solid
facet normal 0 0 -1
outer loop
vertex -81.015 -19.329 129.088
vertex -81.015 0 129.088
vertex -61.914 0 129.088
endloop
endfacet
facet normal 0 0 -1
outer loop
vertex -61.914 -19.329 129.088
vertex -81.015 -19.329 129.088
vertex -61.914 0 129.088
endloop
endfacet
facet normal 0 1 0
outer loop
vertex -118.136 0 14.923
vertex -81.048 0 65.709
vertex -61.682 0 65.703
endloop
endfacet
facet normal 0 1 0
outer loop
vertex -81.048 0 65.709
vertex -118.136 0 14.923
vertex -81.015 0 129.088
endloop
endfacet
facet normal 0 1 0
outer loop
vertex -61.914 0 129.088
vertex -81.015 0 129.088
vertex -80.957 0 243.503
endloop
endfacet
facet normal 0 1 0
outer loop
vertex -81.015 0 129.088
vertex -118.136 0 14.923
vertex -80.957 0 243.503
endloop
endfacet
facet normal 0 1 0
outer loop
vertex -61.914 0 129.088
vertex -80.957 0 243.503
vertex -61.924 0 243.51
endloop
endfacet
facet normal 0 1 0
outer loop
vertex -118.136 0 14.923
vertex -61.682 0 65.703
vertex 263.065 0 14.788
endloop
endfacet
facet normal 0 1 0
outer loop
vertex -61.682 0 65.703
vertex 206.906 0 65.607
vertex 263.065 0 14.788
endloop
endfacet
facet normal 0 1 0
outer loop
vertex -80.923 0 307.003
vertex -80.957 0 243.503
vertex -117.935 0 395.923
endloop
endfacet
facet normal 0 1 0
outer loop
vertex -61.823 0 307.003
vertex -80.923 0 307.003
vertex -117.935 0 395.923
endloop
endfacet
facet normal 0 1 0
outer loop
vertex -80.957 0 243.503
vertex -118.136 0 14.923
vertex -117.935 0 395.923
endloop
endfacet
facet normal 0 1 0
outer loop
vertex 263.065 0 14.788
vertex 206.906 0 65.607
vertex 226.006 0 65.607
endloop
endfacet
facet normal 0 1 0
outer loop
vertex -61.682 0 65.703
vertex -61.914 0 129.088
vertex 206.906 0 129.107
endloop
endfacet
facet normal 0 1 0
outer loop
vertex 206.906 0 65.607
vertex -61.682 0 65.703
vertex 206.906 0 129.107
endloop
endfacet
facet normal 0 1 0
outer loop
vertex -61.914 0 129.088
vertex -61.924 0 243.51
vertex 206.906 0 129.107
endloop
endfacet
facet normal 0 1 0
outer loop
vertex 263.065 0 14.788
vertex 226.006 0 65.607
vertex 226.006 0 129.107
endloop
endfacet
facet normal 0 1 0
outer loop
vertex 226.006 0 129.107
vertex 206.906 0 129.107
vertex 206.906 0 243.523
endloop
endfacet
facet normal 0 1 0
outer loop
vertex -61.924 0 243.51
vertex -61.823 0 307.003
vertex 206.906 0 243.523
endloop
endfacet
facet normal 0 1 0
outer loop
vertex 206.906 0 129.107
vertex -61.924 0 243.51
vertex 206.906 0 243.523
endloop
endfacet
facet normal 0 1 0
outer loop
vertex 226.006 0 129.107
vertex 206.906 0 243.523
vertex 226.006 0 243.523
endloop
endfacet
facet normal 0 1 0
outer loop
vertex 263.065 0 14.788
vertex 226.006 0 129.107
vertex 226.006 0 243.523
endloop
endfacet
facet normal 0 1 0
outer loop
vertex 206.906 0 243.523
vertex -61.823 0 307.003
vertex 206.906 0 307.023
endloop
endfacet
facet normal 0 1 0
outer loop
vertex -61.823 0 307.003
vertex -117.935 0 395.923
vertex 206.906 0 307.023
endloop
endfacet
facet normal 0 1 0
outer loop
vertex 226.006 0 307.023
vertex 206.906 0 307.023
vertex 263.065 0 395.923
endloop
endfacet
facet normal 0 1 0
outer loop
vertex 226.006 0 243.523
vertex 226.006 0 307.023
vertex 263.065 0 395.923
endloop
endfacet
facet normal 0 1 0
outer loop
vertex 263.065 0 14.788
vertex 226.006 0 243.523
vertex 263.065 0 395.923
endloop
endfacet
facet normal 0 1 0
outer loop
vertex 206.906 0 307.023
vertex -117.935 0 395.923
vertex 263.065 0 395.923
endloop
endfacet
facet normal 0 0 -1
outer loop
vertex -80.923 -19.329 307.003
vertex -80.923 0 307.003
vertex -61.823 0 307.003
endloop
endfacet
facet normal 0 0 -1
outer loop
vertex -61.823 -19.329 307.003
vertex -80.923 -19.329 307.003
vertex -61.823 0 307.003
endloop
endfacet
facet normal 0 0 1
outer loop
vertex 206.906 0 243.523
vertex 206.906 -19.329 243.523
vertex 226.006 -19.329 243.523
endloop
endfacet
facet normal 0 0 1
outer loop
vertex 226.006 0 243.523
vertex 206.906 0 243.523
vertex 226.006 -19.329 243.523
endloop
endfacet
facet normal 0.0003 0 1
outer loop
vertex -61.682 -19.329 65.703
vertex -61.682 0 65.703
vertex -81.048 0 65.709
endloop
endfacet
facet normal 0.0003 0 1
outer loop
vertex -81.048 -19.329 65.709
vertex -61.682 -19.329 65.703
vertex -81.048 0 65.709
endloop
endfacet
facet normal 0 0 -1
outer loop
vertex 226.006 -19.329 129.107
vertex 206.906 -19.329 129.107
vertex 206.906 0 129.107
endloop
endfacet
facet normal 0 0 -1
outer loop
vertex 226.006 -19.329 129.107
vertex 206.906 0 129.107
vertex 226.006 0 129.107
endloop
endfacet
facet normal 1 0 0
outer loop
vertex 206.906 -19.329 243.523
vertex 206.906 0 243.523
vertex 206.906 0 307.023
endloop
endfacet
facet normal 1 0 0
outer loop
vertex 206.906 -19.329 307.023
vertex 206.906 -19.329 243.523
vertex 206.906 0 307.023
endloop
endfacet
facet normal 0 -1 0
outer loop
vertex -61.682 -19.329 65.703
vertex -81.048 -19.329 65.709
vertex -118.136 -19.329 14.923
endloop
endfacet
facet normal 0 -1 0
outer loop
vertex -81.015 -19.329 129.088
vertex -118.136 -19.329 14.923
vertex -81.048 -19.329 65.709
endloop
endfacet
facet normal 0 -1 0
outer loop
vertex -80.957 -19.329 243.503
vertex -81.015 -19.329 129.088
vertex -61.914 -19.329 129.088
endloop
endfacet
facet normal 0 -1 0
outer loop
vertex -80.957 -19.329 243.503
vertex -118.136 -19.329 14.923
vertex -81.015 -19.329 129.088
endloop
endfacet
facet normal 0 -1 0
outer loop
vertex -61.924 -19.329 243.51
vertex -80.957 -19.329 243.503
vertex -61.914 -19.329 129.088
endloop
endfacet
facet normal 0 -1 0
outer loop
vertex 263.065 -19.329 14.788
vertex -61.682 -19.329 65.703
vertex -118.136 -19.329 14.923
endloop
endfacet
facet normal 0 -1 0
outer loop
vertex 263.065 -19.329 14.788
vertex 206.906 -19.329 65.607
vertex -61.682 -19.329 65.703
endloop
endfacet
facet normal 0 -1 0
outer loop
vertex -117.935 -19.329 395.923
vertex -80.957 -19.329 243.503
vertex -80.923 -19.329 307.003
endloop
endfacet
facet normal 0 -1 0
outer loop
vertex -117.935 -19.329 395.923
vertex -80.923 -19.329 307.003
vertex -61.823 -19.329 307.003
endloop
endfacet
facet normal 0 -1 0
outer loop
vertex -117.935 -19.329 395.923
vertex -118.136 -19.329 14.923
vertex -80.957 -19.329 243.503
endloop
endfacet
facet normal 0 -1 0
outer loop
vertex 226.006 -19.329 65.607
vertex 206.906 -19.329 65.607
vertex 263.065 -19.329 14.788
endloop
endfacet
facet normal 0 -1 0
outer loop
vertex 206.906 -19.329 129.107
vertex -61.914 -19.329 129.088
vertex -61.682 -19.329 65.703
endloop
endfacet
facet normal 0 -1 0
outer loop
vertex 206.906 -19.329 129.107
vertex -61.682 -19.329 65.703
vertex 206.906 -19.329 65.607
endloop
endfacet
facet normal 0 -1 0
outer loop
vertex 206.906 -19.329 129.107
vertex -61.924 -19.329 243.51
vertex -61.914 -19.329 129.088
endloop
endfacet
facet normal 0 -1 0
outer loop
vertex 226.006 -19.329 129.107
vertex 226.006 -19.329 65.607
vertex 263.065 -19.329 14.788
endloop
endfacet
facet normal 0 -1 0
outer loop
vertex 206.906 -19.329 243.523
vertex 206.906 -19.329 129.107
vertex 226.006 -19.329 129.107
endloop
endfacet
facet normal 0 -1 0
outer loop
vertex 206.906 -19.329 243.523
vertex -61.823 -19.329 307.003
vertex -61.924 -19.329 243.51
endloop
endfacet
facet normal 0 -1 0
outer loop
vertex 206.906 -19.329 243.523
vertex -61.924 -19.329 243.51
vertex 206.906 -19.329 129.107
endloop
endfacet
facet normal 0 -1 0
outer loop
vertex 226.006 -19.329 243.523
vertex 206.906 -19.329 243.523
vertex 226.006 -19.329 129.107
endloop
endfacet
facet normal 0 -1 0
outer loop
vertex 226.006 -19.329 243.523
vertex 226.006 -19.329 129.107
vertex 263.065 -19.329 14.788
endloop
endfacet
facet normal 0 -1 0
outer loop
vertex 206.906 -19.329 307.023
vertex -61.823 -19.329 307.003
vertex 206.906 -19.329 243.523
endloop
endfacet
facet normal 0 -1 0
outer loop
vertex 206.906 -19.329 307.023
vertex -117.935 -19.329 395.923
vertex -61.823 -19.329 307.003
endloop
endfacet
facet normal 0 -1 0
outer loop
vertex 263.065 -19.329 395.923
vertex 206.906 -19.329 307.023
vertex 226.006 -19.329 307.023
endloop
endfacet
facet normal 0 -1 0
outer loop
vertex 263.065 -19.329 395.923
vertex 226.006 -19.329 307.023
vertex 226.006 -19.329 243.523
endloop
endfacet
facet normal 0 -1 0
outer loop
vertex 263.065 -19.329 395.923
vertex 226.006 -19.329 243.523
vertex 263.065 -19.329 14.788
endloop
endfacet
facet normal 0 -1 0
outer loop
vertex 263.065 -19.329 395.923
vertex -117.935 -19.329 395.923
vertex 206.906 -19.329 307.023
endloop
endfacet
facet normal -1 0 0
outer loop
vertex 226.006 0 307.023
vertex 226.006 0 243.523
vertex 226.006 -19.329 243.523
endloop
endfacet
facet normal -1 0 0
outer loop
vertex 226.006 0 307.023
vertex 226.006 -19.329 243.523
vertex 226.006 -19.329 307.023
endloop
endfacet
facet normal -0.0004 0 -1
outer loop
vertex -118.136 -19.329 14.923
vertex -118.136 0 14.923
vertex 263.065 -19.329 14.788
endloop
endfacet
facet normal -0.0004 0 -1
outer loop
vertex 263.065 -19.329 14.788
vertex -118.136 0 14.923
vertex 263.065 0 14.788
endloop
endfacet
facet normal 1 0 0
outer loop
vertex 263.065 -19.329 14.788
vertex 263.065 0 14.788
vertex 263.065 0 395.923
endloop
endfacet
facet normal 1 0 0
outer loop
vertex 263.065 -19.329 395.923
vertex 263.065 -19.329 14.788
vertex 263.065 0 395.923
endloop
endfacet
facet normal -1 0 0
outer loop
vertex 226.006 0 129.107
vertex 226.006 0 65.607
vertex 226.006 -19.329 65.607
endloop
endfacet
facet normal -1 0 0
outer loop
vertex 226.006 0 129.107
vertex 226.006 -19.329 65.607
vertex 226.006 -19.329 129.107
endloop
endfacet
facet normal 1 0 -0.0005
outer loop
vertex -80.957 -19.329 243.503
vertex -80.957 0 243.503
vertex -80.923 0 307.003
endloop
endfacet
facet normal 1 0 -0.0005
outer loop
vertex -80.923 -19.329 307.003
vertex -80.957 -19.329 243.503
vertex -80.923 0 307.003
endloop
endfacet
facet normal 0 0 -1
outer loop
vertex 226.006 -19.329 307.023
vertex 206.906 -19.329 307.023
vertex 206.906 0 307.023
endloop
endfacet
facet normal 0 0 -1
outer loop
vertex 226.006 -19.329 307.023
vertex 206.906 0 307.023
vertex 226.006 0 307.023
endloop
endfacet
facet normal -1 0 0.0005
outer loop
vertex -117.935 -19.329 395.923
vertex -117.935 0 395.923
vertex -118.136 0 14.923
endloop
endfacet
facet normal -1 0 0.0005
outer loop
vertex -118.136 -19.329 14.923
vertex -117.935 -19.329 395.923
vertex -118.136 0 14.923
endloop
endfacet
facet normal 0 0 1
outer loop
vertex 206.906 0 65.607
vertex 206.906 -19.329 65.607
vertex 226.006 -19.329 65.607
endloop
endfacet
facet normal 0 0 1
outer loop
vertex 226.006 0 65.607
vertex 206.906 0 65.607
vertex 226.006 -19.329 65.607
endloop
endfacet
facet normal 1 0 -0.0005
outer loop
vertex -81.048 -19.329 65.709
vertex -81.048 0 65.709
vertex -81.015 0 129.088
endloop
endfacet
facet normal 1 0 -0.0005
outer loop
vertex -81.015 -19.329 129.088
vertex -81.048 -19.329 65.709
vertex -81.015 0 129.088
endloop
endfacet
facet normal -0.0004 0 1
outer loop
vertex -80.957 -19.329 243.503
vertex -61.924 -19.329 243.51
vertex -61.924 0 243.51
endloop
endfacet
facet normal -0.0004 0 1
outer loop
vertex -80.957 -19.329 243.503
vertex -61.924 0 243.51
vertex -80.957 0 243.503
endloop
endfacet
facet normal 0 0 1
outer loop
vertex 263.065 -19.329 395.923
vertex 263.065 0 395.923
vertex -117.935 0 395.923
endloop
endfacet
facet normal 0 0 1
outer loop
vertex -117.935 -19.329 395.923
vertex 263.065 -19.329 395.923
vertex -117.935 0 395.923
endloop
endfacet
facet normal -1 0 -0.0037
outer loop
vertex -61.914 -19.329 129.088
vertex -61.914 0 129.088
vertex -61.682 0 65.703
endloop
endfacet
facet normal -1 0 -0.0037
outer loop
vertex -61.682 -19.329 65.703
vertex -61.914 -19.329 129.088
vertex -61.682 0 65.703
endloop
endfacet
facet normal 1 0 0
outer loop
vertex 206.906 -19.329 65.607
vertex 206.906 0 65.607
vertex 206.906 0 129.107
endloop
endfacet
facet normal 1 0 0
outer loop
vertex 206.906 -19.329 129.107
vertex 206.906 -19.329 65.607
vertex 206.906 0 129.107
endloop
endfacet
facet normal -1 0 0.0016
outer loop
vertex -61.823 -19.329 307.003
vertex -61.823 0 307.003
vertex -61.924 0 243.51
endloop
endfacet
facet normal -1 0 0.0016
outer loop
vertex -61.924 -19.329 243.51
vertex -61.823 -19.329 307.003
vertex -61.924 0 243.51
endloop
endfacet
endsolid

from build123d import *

# Parameters (mm, degrees)
F0_W     = 19.1008
F0_H     = 63.5
F1_DEPTH = 19.3294


with BuildPart() as f1:
    # F0 (on Front) → F1 (new body)
    with BuildSketch(Plane.XZ):
        Polygon((263.06506, 395.92291), (-117.93494, 395.92291), (-118.136241, 14.92291), (263.06506, 14.787505), align=None)
        Polygon((-81.015004, 129.087942), (-61.914204, 129.087942), (-61.682431, 65.702861), (-81.04849, 65.709486), align=None, mode=Mode.SUBTRACT)
        with Locations((216.45606, 97.357456)):
            Rectangle(F0_W, F0_H, mode=Mode.SUBTRACT)
        Polygon((-80.956865, 243.503396), (-80.923315, 307.003359), (-61.822515, 307.003359), (-61.924184, 243.509798), align=None, mode=Mode.SUBTRACT)
        with Locations((216.45606, 275.27291)):
            Rectangle(F0_W, F0_H, mode=Mode.SUBTRACT)
    extrude(amount=F1_DEPTH)


solid = f1.part
